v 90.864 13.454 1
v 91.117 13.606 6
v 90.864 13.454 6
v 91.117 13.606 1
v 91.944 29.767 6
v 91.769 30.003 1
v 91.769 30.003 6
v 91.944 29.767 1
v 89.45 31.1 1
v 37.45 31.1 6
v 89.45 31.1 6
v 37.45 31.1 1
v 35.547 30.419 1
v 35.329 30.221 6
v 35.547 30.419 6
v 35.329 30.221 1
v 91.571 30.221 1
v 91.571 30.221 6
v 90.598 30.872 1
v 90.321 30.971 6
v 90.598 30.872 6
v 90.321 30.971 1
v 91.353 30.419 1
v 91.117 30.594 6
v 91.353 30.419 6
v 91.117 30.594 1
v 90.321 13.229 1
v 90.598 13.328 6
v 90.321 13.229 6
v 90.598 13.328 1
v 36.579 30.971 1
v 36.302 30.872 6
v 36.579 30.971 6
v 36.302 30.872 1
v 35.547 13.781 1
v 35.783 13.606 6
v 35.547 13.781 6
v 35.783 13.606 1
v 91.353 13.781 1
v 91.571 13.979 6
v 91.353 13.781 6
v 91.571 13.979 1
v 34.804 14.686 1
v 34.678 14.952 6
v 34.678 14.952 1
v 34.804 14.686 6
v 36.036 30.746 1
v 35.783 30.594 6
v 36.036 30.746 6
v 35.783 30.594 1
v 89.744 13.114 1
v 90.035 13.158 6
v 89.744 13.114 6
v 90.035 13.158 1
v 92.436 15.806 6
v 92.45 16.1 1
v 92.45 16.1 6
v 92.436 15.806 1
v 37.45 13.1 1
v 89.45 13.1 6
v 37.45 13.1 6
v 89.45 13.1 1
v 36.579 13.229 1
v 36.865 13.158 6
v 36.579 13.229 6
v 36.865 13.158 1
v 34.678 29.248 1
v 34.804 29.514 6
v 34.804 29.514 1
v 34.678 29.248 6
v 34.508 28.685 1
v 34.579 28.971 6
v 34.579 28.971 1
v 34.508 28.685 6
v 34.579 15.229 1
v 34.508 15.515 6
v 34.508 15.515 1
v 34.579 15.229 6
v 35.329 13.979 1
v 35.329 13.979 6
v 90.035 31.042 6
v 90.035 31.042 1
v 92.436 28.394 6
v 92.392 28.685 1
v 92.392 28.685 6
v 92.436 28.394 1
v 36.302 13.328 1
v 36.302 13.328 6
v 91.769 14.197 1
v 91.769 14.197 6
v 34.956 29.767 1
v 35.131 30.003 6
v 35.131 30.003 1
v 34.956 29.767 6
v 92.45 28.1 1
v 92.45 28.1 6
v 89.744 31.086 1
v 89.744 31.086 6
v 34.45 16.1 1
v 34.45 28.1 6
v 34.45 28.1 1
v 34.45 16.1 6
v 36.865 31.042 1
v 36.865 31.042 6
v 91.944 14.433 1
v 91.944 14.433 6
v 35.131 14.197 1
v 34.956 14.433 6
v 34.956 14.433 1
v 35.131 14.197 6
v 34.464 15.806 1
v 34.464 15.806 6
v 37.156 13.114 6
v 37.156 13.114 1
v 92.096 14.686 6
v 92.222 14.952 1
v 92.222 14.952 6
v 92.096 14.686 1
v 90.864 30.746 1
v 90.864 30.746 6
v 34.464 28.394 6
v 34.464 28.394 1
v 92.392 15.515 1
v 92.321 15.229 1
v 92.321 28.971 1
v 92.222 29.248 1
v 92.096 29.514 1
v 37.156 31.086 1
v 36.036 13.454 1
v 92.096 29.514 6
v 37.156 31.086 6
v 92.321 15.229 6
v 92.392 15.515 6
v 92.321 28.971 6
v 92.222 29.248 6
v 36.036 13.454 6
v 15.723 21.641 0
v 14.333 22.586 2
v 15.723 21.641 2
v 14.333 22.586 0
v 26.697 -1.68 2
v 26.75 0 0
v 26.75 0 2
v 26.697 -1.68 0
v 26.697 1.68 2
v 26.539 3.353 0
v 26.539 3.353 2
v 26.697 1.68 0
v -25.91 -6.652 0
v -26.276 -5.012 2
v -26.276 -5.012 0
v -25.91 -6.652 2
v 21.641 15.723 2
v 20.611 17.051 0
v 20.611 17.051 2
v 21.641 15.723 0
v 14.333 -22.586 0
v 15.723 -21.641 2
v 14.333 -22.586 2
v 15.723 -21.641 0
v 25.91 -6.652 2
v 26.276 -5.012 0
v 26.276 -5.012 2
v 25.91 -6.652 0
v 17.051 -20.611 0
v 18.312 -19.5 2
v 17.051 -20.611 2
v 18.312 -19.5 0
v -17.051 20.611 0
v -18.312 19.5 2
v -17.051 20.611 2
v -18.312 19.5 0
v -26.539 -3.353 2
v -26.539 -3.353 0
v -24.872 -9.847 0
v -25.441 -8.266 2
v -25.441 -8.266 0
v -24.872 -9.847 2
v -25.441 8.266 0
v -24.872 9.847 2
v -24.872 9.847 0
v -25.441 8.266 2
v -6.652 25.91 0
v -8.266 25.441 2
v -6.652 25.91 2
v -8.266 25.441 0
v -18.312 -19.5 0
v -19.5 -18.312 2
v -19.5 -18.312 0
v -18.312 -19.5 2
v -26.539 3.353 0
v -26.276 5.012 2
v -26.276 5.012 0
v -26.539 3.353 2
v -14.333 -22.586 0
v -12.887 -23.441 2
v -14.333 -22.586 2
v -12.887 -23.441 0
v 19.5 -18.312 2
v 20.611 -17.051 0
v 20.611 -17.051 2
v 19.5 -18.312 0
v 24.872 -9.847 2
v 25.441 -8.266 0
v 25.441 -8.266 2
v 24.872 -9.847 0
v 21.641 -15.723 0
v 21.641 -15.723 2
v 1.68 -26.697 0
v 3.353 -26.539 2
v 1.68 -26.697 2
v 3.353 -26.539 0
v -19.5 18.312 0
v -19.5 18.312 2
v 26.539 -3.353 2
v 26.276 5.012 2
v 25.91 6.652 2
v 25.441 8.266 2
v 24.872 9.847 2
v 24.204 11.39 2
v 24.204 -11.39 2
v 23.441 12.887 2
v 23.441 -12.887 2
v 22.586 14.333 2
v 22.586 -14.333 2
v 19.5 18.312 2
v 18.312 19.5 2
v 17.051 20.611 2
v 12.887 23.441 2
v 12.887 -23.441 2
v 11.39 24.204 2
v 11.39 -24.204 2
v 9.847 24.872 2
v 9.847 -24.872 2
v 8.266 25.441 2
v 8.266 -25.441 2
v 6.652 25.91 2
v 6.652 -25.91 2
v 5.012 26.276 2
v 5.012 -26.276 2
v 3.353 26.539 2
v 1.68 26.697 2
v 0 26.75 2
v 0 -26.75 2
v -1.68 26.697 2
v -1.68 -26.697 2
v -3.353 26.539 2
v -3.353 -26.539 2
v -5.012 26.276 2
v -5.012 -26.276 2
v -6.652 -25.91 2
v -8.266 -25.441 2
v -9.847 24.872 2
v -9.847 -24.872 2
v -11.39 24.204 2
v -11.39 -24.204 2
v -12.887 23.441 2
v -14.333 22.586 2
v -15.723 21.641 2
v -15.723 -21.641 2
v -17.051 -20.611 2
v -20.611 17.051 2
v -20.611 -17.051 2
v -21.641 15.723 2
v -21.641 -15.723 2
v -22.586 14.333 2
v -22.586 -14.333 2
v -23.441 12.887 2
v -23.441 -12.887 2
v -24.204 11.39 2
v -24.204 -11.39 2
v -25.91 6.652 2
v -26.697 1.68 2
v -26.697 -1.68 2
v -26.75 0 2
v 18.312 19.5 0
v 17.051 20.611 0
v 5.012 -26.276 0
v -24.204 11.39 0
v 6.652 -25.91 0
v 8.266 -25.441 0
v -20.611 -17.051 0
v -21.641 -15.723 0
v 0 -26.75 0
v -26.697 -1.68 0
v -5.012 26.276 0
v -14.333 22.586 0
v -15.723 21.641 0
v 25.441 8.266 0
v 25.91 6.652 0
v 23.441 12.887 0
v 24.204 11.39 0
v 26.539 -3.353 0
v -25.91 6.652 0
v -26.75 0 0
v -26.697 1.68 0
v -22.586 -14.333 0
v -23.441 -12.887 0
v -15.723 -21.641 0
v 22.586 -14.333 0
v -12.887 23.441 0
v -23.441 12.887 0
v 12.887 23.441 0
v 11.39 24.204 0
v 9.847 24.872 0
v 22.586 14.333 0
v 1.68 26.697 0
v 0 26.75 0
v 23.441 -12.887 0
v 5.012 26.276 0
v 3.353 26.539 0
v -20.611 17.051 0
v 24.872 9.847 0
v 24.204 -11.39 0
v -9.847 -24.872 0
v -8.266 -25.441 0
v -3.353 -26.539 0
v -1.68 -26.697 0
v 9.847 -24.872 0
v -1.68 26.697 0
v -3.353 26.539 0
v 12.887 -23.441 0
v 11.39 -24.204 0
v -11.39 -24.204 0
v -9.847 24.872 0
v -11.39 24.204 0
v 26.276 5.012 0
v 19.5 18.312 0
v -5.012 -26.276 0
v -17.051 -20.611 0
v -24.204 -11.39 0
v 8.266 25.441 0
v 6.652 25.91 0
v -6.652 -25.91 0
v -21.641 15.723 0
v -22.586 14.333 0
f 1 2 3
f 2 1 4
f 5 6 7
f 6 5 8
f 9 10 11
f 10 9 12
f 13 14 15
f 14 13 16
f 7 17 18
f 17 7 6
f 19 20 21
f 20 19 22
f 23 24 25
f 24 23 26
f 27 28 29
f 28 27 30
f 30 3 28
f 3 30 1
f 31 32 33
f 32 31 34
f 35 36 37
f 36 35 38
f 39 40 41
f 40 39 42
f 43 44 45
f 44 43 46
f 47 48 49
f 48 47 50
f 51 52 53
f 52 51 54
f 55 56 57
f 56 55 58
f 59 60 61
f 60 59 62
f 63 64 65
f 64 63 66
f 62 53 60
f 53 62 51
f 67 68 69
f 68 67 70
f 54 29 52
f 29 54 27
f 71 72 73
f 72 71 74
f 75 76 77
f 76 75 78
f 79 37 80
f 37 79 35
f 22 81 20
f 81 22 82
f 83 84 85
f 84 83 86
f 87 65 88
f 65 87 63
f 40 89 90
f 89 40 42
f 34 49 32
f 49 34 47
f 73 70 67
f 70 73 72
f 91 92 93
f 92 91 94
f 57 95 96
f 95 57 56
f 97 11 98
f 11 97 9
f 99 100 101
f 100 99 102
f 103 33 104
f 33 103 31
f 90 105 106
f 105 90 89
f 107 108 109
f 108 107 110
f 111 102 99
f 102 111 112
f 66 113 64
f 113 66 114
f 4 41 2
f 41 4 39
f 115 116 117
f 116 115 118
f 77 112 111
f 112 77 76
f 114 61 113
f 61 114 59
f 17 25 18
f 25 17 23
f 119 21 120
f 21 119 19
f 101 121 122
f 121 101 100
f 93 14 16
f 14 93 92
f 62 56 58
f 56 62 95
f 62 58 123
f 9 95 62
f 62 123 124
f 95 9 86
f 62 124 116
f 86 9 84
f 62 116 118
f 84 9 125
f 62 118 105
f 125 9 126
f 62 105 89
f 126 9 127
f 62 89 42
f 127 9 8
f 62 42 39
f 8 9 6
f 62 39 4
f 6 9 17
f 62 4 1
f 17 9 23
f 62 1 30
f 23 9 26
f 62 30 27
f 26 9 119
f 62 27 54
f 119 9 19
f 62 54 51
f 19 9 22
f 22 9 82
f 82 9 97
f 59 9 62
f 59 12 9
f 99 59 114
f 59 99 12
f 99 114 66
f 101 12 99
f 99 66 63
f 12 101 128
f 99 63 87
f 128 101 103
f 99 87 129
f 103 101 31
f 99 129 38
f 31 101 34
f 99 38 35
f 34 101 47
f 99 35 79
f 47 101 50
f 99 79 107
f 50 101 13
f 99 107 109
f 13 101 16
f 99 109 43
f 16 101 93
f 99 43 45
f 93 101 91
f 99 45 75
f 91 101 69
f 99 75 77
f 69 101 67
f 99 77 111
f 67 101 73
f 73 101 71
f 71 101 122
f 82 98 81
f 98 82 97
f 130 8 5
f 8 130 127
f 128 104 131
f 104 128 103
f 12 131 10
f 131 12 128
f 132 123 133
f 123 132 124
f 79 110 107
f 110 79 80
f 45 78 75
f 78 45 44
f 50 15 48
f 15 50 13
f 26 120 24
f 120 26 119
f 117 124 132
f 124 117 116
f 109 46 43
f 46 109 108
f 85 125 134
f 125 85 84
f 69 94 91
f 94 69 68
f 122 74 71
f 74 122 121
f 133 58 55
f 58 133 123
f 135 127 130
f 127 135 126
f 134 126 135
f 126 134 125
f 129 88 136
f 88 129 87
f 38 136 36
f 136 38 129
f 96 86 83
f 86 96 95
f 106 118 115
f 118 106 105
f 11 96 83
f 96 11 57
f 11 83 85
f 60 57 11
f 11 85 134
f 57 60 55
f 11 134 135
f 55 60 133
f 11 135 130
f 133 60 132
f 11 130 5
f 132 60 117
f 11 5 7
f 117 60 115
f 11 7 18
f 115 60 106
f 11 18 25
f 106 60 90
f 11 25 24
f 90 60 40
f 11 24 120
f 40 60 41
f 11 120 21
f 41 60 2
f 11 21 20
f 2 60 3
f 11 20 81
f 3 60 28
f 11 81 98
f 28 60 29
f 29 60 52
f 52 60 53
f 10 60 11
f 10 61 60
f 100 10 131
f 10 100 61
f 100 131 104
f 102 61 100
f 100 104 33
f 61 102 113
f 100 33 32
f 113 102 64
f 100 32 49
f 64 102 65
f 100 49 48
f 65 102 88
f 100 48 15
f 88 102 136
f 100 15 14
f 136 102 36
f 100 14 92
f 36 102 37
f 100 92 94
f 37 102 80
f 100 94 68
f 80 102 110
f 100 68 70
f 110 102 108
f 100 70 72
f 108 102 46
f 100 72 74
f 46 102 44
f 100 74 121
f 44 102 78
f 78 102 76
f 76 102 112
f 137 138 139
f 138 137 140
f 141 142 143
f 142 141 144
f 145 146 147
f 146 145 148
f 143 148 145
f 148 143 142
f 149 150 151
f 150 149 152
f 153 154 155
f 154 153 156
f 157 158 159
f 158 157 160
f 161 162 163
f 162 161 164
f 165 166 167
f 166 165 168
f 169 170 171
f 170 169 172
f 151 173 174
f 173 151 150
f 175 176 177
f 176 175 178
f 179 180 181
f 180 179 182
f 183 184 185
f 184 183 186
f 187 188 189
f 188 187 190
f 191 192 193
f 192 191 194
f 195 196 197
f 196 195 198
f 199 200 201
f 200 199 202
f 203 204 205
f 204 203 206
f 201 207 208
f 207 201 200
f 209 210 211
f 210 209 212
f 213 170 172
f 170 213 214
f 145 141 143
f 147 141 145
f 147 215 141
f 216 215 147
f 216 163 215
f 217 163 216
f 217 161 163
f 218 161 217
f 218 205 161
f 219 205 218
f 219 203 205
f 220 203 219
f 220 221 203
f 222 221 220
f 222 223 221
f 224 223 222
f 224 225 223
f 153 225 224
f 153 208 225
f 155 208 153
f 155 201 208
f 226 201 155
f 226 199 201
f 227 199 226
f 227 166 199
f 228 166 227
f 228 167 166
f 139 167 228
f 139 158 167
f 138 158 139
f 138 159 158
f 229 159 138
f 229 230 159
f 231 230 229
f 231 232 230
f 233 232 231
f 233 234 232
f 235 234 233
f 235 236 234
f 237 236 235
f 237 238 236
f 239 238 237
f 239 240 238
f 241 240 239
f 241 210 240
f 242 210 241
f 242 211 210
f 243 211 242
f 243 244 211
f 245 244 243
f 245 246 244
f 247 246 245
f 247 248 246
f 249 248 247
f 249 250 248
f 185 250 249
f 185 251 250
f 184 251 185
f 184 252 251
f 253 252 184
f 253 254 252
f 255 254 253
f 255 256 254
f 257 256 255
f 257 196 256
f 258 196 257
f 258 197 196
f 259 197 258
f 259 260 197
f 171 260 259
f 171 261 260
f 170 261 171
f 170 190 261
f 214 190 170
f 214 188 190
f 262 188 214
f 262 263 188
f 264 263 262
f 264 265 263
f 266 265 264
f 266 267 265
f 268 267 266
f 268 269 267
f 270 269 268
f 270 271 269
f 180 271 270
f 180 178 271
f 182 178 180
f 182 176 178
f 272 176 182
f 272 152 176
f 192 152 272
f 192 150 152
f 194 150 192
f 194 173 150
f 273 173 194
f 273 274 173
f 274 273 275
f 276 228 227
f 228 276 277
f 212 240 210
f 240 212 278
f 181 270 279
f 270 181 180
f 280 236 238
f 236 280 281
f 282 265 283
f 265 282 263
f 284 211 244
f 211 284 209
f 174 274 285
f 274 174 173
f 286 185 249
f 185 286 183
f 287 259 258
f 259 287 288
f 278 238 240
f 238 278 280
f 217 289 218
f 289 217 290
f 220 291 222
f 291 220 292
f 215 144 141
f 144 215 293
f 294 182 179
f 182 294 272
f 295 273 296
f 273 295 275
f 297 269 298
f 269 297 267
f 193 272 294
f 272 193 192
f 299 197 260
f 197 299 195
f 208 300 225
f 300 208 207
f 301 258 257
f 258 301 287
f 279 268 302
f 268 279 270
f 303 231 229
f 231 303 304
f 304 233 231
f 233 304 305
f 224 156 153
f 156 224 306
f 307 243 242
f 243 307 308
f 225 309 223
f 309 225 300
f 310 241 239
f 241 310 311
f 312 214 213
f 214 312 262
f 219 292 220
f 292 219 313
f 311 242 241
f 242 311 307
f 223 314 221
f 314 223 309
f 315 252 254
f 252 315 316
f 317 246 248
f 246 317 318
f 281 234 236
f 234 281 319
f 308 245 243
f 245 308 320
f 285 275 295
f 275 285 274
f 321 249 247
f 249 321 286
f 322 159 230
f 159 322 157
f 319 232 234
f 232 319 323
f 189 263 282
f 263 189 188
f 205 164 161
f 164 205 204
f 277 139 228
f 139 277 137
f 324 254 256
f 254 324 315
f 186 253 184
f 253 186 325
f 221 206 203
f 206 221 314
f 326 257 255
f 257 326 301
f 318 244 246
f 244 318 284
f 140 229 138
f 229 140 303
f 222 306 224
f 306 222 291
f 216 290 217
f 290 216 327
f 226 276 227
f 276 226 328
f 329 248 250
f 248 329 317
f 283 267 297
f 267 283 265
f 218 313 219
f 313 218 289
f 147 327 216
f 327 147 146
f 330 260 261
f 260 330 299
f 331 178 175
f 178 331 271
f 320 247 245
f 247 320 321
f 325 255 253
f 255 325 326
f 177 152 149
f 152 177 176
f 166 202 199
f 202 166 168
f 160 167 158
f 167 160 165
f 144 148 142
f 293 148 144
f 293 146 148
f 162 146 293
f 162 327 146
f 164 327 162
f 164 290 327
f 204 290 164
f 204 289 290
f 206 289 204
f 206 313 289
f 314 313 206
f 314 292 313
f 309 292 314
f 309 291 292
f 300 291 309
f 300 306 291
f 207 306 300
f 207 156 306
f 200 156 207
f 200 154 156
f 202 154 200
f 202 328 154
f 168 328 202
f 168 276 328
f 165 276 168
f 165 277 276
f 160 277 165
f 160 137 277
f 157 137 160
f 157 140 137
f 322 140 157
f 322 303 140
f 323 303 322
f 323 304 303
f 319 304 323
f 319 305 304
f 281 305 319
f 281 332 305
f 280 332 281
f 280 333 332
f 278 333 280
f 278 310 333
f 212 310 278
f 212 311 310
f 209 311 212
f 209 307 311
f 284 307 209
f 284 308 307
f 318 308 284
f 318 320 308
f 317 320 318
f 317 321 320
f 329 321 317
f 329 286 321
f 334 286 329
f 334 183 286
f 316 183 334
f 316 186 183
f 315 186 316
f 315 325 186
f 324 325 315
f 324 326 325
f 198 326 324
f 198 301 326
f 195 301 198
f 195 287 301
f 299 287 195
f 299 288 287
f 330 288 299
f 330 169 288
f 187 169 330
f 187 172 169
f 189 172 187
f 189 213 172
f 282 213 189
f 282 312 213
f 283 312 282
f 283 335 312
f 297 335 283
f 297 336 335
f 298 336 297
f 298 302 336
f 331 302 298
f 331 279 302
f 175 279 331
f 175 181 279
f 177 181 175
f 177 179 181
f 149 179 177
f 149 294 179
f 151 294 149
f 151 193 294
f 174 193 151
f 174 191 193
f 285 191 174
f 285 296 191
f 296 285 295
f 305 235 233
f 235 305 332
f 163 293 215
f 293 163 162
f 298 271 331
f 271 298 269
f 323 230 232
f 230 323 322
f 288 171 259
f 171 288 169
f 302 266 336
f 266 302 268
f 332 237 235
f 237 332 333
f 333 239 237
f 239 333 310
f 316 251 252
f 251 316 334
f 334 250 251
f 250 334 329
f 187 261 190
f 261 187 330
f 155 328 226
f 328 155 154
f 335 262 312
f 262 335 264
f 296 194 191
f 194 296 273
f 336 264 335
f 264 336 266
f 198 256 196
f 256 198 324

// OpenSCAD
// file: parts.scad
Mtolerance = 0.1;
M5size = 7.8;

function M5() = M5size + Mtolerance;

// Fits a standard M2.5 nut when printed with PLA the nut does not fall out
function M2_5_Pla() = 4.95 + Mtolerance;

// Fits a standard M2.5 nut. The nut falls out. Ideal for metal printing
function M2_5() = 5.05 + Mtolerance;

module hexHole(flatToFlatDistance, depth) {
    previewOptimize = 0.1;
    hexagonSide = flatToFlatDistance / (cos(30) * 2);

    translate([0, 0, -previewOptimize]) {
        linear_extrude(height=depth + previewOptimize * 2, center=false) {
            polygon(points=[
                    [hexagonSide, 0],
                    [hexagonSide / 2, sqrt(3) * hexagonSide / 2],
                    [-hexagonSide / 2, sqrt(3) * hexagonSide / 2],
                    [-hexagonSide, 0],
                    [-hexagonSide / 2, -sqrt(3) * hexagonSide / 2],
                    [hexagonSide / 2, -sqrt(3) * hexagonSide / 2]
                ]);
        }
    }
}

// Rounded rectangle module
module rounded_rectangle(width, length, r, fn=64) {
    // ensure radius doesn't exceed half of width/height
    rr = min(r, width/2, length/2);

    translate([rr, rr])
        offset(r=rr, $fn=fn)
            square([width - 2*rr, length - 2*rr]);

}
// main file
use <./parts.scad>

n=5;
dist=2;

translate([70.6/2 - 1.7/2,5.1+8,1])
    linear_extrude(height=5)
        rounded_rectangle(width=58, length=n*2+(n-1)*dist, r=3);

cylinder(d=53.5, h=2, center=false, $fn=100);
